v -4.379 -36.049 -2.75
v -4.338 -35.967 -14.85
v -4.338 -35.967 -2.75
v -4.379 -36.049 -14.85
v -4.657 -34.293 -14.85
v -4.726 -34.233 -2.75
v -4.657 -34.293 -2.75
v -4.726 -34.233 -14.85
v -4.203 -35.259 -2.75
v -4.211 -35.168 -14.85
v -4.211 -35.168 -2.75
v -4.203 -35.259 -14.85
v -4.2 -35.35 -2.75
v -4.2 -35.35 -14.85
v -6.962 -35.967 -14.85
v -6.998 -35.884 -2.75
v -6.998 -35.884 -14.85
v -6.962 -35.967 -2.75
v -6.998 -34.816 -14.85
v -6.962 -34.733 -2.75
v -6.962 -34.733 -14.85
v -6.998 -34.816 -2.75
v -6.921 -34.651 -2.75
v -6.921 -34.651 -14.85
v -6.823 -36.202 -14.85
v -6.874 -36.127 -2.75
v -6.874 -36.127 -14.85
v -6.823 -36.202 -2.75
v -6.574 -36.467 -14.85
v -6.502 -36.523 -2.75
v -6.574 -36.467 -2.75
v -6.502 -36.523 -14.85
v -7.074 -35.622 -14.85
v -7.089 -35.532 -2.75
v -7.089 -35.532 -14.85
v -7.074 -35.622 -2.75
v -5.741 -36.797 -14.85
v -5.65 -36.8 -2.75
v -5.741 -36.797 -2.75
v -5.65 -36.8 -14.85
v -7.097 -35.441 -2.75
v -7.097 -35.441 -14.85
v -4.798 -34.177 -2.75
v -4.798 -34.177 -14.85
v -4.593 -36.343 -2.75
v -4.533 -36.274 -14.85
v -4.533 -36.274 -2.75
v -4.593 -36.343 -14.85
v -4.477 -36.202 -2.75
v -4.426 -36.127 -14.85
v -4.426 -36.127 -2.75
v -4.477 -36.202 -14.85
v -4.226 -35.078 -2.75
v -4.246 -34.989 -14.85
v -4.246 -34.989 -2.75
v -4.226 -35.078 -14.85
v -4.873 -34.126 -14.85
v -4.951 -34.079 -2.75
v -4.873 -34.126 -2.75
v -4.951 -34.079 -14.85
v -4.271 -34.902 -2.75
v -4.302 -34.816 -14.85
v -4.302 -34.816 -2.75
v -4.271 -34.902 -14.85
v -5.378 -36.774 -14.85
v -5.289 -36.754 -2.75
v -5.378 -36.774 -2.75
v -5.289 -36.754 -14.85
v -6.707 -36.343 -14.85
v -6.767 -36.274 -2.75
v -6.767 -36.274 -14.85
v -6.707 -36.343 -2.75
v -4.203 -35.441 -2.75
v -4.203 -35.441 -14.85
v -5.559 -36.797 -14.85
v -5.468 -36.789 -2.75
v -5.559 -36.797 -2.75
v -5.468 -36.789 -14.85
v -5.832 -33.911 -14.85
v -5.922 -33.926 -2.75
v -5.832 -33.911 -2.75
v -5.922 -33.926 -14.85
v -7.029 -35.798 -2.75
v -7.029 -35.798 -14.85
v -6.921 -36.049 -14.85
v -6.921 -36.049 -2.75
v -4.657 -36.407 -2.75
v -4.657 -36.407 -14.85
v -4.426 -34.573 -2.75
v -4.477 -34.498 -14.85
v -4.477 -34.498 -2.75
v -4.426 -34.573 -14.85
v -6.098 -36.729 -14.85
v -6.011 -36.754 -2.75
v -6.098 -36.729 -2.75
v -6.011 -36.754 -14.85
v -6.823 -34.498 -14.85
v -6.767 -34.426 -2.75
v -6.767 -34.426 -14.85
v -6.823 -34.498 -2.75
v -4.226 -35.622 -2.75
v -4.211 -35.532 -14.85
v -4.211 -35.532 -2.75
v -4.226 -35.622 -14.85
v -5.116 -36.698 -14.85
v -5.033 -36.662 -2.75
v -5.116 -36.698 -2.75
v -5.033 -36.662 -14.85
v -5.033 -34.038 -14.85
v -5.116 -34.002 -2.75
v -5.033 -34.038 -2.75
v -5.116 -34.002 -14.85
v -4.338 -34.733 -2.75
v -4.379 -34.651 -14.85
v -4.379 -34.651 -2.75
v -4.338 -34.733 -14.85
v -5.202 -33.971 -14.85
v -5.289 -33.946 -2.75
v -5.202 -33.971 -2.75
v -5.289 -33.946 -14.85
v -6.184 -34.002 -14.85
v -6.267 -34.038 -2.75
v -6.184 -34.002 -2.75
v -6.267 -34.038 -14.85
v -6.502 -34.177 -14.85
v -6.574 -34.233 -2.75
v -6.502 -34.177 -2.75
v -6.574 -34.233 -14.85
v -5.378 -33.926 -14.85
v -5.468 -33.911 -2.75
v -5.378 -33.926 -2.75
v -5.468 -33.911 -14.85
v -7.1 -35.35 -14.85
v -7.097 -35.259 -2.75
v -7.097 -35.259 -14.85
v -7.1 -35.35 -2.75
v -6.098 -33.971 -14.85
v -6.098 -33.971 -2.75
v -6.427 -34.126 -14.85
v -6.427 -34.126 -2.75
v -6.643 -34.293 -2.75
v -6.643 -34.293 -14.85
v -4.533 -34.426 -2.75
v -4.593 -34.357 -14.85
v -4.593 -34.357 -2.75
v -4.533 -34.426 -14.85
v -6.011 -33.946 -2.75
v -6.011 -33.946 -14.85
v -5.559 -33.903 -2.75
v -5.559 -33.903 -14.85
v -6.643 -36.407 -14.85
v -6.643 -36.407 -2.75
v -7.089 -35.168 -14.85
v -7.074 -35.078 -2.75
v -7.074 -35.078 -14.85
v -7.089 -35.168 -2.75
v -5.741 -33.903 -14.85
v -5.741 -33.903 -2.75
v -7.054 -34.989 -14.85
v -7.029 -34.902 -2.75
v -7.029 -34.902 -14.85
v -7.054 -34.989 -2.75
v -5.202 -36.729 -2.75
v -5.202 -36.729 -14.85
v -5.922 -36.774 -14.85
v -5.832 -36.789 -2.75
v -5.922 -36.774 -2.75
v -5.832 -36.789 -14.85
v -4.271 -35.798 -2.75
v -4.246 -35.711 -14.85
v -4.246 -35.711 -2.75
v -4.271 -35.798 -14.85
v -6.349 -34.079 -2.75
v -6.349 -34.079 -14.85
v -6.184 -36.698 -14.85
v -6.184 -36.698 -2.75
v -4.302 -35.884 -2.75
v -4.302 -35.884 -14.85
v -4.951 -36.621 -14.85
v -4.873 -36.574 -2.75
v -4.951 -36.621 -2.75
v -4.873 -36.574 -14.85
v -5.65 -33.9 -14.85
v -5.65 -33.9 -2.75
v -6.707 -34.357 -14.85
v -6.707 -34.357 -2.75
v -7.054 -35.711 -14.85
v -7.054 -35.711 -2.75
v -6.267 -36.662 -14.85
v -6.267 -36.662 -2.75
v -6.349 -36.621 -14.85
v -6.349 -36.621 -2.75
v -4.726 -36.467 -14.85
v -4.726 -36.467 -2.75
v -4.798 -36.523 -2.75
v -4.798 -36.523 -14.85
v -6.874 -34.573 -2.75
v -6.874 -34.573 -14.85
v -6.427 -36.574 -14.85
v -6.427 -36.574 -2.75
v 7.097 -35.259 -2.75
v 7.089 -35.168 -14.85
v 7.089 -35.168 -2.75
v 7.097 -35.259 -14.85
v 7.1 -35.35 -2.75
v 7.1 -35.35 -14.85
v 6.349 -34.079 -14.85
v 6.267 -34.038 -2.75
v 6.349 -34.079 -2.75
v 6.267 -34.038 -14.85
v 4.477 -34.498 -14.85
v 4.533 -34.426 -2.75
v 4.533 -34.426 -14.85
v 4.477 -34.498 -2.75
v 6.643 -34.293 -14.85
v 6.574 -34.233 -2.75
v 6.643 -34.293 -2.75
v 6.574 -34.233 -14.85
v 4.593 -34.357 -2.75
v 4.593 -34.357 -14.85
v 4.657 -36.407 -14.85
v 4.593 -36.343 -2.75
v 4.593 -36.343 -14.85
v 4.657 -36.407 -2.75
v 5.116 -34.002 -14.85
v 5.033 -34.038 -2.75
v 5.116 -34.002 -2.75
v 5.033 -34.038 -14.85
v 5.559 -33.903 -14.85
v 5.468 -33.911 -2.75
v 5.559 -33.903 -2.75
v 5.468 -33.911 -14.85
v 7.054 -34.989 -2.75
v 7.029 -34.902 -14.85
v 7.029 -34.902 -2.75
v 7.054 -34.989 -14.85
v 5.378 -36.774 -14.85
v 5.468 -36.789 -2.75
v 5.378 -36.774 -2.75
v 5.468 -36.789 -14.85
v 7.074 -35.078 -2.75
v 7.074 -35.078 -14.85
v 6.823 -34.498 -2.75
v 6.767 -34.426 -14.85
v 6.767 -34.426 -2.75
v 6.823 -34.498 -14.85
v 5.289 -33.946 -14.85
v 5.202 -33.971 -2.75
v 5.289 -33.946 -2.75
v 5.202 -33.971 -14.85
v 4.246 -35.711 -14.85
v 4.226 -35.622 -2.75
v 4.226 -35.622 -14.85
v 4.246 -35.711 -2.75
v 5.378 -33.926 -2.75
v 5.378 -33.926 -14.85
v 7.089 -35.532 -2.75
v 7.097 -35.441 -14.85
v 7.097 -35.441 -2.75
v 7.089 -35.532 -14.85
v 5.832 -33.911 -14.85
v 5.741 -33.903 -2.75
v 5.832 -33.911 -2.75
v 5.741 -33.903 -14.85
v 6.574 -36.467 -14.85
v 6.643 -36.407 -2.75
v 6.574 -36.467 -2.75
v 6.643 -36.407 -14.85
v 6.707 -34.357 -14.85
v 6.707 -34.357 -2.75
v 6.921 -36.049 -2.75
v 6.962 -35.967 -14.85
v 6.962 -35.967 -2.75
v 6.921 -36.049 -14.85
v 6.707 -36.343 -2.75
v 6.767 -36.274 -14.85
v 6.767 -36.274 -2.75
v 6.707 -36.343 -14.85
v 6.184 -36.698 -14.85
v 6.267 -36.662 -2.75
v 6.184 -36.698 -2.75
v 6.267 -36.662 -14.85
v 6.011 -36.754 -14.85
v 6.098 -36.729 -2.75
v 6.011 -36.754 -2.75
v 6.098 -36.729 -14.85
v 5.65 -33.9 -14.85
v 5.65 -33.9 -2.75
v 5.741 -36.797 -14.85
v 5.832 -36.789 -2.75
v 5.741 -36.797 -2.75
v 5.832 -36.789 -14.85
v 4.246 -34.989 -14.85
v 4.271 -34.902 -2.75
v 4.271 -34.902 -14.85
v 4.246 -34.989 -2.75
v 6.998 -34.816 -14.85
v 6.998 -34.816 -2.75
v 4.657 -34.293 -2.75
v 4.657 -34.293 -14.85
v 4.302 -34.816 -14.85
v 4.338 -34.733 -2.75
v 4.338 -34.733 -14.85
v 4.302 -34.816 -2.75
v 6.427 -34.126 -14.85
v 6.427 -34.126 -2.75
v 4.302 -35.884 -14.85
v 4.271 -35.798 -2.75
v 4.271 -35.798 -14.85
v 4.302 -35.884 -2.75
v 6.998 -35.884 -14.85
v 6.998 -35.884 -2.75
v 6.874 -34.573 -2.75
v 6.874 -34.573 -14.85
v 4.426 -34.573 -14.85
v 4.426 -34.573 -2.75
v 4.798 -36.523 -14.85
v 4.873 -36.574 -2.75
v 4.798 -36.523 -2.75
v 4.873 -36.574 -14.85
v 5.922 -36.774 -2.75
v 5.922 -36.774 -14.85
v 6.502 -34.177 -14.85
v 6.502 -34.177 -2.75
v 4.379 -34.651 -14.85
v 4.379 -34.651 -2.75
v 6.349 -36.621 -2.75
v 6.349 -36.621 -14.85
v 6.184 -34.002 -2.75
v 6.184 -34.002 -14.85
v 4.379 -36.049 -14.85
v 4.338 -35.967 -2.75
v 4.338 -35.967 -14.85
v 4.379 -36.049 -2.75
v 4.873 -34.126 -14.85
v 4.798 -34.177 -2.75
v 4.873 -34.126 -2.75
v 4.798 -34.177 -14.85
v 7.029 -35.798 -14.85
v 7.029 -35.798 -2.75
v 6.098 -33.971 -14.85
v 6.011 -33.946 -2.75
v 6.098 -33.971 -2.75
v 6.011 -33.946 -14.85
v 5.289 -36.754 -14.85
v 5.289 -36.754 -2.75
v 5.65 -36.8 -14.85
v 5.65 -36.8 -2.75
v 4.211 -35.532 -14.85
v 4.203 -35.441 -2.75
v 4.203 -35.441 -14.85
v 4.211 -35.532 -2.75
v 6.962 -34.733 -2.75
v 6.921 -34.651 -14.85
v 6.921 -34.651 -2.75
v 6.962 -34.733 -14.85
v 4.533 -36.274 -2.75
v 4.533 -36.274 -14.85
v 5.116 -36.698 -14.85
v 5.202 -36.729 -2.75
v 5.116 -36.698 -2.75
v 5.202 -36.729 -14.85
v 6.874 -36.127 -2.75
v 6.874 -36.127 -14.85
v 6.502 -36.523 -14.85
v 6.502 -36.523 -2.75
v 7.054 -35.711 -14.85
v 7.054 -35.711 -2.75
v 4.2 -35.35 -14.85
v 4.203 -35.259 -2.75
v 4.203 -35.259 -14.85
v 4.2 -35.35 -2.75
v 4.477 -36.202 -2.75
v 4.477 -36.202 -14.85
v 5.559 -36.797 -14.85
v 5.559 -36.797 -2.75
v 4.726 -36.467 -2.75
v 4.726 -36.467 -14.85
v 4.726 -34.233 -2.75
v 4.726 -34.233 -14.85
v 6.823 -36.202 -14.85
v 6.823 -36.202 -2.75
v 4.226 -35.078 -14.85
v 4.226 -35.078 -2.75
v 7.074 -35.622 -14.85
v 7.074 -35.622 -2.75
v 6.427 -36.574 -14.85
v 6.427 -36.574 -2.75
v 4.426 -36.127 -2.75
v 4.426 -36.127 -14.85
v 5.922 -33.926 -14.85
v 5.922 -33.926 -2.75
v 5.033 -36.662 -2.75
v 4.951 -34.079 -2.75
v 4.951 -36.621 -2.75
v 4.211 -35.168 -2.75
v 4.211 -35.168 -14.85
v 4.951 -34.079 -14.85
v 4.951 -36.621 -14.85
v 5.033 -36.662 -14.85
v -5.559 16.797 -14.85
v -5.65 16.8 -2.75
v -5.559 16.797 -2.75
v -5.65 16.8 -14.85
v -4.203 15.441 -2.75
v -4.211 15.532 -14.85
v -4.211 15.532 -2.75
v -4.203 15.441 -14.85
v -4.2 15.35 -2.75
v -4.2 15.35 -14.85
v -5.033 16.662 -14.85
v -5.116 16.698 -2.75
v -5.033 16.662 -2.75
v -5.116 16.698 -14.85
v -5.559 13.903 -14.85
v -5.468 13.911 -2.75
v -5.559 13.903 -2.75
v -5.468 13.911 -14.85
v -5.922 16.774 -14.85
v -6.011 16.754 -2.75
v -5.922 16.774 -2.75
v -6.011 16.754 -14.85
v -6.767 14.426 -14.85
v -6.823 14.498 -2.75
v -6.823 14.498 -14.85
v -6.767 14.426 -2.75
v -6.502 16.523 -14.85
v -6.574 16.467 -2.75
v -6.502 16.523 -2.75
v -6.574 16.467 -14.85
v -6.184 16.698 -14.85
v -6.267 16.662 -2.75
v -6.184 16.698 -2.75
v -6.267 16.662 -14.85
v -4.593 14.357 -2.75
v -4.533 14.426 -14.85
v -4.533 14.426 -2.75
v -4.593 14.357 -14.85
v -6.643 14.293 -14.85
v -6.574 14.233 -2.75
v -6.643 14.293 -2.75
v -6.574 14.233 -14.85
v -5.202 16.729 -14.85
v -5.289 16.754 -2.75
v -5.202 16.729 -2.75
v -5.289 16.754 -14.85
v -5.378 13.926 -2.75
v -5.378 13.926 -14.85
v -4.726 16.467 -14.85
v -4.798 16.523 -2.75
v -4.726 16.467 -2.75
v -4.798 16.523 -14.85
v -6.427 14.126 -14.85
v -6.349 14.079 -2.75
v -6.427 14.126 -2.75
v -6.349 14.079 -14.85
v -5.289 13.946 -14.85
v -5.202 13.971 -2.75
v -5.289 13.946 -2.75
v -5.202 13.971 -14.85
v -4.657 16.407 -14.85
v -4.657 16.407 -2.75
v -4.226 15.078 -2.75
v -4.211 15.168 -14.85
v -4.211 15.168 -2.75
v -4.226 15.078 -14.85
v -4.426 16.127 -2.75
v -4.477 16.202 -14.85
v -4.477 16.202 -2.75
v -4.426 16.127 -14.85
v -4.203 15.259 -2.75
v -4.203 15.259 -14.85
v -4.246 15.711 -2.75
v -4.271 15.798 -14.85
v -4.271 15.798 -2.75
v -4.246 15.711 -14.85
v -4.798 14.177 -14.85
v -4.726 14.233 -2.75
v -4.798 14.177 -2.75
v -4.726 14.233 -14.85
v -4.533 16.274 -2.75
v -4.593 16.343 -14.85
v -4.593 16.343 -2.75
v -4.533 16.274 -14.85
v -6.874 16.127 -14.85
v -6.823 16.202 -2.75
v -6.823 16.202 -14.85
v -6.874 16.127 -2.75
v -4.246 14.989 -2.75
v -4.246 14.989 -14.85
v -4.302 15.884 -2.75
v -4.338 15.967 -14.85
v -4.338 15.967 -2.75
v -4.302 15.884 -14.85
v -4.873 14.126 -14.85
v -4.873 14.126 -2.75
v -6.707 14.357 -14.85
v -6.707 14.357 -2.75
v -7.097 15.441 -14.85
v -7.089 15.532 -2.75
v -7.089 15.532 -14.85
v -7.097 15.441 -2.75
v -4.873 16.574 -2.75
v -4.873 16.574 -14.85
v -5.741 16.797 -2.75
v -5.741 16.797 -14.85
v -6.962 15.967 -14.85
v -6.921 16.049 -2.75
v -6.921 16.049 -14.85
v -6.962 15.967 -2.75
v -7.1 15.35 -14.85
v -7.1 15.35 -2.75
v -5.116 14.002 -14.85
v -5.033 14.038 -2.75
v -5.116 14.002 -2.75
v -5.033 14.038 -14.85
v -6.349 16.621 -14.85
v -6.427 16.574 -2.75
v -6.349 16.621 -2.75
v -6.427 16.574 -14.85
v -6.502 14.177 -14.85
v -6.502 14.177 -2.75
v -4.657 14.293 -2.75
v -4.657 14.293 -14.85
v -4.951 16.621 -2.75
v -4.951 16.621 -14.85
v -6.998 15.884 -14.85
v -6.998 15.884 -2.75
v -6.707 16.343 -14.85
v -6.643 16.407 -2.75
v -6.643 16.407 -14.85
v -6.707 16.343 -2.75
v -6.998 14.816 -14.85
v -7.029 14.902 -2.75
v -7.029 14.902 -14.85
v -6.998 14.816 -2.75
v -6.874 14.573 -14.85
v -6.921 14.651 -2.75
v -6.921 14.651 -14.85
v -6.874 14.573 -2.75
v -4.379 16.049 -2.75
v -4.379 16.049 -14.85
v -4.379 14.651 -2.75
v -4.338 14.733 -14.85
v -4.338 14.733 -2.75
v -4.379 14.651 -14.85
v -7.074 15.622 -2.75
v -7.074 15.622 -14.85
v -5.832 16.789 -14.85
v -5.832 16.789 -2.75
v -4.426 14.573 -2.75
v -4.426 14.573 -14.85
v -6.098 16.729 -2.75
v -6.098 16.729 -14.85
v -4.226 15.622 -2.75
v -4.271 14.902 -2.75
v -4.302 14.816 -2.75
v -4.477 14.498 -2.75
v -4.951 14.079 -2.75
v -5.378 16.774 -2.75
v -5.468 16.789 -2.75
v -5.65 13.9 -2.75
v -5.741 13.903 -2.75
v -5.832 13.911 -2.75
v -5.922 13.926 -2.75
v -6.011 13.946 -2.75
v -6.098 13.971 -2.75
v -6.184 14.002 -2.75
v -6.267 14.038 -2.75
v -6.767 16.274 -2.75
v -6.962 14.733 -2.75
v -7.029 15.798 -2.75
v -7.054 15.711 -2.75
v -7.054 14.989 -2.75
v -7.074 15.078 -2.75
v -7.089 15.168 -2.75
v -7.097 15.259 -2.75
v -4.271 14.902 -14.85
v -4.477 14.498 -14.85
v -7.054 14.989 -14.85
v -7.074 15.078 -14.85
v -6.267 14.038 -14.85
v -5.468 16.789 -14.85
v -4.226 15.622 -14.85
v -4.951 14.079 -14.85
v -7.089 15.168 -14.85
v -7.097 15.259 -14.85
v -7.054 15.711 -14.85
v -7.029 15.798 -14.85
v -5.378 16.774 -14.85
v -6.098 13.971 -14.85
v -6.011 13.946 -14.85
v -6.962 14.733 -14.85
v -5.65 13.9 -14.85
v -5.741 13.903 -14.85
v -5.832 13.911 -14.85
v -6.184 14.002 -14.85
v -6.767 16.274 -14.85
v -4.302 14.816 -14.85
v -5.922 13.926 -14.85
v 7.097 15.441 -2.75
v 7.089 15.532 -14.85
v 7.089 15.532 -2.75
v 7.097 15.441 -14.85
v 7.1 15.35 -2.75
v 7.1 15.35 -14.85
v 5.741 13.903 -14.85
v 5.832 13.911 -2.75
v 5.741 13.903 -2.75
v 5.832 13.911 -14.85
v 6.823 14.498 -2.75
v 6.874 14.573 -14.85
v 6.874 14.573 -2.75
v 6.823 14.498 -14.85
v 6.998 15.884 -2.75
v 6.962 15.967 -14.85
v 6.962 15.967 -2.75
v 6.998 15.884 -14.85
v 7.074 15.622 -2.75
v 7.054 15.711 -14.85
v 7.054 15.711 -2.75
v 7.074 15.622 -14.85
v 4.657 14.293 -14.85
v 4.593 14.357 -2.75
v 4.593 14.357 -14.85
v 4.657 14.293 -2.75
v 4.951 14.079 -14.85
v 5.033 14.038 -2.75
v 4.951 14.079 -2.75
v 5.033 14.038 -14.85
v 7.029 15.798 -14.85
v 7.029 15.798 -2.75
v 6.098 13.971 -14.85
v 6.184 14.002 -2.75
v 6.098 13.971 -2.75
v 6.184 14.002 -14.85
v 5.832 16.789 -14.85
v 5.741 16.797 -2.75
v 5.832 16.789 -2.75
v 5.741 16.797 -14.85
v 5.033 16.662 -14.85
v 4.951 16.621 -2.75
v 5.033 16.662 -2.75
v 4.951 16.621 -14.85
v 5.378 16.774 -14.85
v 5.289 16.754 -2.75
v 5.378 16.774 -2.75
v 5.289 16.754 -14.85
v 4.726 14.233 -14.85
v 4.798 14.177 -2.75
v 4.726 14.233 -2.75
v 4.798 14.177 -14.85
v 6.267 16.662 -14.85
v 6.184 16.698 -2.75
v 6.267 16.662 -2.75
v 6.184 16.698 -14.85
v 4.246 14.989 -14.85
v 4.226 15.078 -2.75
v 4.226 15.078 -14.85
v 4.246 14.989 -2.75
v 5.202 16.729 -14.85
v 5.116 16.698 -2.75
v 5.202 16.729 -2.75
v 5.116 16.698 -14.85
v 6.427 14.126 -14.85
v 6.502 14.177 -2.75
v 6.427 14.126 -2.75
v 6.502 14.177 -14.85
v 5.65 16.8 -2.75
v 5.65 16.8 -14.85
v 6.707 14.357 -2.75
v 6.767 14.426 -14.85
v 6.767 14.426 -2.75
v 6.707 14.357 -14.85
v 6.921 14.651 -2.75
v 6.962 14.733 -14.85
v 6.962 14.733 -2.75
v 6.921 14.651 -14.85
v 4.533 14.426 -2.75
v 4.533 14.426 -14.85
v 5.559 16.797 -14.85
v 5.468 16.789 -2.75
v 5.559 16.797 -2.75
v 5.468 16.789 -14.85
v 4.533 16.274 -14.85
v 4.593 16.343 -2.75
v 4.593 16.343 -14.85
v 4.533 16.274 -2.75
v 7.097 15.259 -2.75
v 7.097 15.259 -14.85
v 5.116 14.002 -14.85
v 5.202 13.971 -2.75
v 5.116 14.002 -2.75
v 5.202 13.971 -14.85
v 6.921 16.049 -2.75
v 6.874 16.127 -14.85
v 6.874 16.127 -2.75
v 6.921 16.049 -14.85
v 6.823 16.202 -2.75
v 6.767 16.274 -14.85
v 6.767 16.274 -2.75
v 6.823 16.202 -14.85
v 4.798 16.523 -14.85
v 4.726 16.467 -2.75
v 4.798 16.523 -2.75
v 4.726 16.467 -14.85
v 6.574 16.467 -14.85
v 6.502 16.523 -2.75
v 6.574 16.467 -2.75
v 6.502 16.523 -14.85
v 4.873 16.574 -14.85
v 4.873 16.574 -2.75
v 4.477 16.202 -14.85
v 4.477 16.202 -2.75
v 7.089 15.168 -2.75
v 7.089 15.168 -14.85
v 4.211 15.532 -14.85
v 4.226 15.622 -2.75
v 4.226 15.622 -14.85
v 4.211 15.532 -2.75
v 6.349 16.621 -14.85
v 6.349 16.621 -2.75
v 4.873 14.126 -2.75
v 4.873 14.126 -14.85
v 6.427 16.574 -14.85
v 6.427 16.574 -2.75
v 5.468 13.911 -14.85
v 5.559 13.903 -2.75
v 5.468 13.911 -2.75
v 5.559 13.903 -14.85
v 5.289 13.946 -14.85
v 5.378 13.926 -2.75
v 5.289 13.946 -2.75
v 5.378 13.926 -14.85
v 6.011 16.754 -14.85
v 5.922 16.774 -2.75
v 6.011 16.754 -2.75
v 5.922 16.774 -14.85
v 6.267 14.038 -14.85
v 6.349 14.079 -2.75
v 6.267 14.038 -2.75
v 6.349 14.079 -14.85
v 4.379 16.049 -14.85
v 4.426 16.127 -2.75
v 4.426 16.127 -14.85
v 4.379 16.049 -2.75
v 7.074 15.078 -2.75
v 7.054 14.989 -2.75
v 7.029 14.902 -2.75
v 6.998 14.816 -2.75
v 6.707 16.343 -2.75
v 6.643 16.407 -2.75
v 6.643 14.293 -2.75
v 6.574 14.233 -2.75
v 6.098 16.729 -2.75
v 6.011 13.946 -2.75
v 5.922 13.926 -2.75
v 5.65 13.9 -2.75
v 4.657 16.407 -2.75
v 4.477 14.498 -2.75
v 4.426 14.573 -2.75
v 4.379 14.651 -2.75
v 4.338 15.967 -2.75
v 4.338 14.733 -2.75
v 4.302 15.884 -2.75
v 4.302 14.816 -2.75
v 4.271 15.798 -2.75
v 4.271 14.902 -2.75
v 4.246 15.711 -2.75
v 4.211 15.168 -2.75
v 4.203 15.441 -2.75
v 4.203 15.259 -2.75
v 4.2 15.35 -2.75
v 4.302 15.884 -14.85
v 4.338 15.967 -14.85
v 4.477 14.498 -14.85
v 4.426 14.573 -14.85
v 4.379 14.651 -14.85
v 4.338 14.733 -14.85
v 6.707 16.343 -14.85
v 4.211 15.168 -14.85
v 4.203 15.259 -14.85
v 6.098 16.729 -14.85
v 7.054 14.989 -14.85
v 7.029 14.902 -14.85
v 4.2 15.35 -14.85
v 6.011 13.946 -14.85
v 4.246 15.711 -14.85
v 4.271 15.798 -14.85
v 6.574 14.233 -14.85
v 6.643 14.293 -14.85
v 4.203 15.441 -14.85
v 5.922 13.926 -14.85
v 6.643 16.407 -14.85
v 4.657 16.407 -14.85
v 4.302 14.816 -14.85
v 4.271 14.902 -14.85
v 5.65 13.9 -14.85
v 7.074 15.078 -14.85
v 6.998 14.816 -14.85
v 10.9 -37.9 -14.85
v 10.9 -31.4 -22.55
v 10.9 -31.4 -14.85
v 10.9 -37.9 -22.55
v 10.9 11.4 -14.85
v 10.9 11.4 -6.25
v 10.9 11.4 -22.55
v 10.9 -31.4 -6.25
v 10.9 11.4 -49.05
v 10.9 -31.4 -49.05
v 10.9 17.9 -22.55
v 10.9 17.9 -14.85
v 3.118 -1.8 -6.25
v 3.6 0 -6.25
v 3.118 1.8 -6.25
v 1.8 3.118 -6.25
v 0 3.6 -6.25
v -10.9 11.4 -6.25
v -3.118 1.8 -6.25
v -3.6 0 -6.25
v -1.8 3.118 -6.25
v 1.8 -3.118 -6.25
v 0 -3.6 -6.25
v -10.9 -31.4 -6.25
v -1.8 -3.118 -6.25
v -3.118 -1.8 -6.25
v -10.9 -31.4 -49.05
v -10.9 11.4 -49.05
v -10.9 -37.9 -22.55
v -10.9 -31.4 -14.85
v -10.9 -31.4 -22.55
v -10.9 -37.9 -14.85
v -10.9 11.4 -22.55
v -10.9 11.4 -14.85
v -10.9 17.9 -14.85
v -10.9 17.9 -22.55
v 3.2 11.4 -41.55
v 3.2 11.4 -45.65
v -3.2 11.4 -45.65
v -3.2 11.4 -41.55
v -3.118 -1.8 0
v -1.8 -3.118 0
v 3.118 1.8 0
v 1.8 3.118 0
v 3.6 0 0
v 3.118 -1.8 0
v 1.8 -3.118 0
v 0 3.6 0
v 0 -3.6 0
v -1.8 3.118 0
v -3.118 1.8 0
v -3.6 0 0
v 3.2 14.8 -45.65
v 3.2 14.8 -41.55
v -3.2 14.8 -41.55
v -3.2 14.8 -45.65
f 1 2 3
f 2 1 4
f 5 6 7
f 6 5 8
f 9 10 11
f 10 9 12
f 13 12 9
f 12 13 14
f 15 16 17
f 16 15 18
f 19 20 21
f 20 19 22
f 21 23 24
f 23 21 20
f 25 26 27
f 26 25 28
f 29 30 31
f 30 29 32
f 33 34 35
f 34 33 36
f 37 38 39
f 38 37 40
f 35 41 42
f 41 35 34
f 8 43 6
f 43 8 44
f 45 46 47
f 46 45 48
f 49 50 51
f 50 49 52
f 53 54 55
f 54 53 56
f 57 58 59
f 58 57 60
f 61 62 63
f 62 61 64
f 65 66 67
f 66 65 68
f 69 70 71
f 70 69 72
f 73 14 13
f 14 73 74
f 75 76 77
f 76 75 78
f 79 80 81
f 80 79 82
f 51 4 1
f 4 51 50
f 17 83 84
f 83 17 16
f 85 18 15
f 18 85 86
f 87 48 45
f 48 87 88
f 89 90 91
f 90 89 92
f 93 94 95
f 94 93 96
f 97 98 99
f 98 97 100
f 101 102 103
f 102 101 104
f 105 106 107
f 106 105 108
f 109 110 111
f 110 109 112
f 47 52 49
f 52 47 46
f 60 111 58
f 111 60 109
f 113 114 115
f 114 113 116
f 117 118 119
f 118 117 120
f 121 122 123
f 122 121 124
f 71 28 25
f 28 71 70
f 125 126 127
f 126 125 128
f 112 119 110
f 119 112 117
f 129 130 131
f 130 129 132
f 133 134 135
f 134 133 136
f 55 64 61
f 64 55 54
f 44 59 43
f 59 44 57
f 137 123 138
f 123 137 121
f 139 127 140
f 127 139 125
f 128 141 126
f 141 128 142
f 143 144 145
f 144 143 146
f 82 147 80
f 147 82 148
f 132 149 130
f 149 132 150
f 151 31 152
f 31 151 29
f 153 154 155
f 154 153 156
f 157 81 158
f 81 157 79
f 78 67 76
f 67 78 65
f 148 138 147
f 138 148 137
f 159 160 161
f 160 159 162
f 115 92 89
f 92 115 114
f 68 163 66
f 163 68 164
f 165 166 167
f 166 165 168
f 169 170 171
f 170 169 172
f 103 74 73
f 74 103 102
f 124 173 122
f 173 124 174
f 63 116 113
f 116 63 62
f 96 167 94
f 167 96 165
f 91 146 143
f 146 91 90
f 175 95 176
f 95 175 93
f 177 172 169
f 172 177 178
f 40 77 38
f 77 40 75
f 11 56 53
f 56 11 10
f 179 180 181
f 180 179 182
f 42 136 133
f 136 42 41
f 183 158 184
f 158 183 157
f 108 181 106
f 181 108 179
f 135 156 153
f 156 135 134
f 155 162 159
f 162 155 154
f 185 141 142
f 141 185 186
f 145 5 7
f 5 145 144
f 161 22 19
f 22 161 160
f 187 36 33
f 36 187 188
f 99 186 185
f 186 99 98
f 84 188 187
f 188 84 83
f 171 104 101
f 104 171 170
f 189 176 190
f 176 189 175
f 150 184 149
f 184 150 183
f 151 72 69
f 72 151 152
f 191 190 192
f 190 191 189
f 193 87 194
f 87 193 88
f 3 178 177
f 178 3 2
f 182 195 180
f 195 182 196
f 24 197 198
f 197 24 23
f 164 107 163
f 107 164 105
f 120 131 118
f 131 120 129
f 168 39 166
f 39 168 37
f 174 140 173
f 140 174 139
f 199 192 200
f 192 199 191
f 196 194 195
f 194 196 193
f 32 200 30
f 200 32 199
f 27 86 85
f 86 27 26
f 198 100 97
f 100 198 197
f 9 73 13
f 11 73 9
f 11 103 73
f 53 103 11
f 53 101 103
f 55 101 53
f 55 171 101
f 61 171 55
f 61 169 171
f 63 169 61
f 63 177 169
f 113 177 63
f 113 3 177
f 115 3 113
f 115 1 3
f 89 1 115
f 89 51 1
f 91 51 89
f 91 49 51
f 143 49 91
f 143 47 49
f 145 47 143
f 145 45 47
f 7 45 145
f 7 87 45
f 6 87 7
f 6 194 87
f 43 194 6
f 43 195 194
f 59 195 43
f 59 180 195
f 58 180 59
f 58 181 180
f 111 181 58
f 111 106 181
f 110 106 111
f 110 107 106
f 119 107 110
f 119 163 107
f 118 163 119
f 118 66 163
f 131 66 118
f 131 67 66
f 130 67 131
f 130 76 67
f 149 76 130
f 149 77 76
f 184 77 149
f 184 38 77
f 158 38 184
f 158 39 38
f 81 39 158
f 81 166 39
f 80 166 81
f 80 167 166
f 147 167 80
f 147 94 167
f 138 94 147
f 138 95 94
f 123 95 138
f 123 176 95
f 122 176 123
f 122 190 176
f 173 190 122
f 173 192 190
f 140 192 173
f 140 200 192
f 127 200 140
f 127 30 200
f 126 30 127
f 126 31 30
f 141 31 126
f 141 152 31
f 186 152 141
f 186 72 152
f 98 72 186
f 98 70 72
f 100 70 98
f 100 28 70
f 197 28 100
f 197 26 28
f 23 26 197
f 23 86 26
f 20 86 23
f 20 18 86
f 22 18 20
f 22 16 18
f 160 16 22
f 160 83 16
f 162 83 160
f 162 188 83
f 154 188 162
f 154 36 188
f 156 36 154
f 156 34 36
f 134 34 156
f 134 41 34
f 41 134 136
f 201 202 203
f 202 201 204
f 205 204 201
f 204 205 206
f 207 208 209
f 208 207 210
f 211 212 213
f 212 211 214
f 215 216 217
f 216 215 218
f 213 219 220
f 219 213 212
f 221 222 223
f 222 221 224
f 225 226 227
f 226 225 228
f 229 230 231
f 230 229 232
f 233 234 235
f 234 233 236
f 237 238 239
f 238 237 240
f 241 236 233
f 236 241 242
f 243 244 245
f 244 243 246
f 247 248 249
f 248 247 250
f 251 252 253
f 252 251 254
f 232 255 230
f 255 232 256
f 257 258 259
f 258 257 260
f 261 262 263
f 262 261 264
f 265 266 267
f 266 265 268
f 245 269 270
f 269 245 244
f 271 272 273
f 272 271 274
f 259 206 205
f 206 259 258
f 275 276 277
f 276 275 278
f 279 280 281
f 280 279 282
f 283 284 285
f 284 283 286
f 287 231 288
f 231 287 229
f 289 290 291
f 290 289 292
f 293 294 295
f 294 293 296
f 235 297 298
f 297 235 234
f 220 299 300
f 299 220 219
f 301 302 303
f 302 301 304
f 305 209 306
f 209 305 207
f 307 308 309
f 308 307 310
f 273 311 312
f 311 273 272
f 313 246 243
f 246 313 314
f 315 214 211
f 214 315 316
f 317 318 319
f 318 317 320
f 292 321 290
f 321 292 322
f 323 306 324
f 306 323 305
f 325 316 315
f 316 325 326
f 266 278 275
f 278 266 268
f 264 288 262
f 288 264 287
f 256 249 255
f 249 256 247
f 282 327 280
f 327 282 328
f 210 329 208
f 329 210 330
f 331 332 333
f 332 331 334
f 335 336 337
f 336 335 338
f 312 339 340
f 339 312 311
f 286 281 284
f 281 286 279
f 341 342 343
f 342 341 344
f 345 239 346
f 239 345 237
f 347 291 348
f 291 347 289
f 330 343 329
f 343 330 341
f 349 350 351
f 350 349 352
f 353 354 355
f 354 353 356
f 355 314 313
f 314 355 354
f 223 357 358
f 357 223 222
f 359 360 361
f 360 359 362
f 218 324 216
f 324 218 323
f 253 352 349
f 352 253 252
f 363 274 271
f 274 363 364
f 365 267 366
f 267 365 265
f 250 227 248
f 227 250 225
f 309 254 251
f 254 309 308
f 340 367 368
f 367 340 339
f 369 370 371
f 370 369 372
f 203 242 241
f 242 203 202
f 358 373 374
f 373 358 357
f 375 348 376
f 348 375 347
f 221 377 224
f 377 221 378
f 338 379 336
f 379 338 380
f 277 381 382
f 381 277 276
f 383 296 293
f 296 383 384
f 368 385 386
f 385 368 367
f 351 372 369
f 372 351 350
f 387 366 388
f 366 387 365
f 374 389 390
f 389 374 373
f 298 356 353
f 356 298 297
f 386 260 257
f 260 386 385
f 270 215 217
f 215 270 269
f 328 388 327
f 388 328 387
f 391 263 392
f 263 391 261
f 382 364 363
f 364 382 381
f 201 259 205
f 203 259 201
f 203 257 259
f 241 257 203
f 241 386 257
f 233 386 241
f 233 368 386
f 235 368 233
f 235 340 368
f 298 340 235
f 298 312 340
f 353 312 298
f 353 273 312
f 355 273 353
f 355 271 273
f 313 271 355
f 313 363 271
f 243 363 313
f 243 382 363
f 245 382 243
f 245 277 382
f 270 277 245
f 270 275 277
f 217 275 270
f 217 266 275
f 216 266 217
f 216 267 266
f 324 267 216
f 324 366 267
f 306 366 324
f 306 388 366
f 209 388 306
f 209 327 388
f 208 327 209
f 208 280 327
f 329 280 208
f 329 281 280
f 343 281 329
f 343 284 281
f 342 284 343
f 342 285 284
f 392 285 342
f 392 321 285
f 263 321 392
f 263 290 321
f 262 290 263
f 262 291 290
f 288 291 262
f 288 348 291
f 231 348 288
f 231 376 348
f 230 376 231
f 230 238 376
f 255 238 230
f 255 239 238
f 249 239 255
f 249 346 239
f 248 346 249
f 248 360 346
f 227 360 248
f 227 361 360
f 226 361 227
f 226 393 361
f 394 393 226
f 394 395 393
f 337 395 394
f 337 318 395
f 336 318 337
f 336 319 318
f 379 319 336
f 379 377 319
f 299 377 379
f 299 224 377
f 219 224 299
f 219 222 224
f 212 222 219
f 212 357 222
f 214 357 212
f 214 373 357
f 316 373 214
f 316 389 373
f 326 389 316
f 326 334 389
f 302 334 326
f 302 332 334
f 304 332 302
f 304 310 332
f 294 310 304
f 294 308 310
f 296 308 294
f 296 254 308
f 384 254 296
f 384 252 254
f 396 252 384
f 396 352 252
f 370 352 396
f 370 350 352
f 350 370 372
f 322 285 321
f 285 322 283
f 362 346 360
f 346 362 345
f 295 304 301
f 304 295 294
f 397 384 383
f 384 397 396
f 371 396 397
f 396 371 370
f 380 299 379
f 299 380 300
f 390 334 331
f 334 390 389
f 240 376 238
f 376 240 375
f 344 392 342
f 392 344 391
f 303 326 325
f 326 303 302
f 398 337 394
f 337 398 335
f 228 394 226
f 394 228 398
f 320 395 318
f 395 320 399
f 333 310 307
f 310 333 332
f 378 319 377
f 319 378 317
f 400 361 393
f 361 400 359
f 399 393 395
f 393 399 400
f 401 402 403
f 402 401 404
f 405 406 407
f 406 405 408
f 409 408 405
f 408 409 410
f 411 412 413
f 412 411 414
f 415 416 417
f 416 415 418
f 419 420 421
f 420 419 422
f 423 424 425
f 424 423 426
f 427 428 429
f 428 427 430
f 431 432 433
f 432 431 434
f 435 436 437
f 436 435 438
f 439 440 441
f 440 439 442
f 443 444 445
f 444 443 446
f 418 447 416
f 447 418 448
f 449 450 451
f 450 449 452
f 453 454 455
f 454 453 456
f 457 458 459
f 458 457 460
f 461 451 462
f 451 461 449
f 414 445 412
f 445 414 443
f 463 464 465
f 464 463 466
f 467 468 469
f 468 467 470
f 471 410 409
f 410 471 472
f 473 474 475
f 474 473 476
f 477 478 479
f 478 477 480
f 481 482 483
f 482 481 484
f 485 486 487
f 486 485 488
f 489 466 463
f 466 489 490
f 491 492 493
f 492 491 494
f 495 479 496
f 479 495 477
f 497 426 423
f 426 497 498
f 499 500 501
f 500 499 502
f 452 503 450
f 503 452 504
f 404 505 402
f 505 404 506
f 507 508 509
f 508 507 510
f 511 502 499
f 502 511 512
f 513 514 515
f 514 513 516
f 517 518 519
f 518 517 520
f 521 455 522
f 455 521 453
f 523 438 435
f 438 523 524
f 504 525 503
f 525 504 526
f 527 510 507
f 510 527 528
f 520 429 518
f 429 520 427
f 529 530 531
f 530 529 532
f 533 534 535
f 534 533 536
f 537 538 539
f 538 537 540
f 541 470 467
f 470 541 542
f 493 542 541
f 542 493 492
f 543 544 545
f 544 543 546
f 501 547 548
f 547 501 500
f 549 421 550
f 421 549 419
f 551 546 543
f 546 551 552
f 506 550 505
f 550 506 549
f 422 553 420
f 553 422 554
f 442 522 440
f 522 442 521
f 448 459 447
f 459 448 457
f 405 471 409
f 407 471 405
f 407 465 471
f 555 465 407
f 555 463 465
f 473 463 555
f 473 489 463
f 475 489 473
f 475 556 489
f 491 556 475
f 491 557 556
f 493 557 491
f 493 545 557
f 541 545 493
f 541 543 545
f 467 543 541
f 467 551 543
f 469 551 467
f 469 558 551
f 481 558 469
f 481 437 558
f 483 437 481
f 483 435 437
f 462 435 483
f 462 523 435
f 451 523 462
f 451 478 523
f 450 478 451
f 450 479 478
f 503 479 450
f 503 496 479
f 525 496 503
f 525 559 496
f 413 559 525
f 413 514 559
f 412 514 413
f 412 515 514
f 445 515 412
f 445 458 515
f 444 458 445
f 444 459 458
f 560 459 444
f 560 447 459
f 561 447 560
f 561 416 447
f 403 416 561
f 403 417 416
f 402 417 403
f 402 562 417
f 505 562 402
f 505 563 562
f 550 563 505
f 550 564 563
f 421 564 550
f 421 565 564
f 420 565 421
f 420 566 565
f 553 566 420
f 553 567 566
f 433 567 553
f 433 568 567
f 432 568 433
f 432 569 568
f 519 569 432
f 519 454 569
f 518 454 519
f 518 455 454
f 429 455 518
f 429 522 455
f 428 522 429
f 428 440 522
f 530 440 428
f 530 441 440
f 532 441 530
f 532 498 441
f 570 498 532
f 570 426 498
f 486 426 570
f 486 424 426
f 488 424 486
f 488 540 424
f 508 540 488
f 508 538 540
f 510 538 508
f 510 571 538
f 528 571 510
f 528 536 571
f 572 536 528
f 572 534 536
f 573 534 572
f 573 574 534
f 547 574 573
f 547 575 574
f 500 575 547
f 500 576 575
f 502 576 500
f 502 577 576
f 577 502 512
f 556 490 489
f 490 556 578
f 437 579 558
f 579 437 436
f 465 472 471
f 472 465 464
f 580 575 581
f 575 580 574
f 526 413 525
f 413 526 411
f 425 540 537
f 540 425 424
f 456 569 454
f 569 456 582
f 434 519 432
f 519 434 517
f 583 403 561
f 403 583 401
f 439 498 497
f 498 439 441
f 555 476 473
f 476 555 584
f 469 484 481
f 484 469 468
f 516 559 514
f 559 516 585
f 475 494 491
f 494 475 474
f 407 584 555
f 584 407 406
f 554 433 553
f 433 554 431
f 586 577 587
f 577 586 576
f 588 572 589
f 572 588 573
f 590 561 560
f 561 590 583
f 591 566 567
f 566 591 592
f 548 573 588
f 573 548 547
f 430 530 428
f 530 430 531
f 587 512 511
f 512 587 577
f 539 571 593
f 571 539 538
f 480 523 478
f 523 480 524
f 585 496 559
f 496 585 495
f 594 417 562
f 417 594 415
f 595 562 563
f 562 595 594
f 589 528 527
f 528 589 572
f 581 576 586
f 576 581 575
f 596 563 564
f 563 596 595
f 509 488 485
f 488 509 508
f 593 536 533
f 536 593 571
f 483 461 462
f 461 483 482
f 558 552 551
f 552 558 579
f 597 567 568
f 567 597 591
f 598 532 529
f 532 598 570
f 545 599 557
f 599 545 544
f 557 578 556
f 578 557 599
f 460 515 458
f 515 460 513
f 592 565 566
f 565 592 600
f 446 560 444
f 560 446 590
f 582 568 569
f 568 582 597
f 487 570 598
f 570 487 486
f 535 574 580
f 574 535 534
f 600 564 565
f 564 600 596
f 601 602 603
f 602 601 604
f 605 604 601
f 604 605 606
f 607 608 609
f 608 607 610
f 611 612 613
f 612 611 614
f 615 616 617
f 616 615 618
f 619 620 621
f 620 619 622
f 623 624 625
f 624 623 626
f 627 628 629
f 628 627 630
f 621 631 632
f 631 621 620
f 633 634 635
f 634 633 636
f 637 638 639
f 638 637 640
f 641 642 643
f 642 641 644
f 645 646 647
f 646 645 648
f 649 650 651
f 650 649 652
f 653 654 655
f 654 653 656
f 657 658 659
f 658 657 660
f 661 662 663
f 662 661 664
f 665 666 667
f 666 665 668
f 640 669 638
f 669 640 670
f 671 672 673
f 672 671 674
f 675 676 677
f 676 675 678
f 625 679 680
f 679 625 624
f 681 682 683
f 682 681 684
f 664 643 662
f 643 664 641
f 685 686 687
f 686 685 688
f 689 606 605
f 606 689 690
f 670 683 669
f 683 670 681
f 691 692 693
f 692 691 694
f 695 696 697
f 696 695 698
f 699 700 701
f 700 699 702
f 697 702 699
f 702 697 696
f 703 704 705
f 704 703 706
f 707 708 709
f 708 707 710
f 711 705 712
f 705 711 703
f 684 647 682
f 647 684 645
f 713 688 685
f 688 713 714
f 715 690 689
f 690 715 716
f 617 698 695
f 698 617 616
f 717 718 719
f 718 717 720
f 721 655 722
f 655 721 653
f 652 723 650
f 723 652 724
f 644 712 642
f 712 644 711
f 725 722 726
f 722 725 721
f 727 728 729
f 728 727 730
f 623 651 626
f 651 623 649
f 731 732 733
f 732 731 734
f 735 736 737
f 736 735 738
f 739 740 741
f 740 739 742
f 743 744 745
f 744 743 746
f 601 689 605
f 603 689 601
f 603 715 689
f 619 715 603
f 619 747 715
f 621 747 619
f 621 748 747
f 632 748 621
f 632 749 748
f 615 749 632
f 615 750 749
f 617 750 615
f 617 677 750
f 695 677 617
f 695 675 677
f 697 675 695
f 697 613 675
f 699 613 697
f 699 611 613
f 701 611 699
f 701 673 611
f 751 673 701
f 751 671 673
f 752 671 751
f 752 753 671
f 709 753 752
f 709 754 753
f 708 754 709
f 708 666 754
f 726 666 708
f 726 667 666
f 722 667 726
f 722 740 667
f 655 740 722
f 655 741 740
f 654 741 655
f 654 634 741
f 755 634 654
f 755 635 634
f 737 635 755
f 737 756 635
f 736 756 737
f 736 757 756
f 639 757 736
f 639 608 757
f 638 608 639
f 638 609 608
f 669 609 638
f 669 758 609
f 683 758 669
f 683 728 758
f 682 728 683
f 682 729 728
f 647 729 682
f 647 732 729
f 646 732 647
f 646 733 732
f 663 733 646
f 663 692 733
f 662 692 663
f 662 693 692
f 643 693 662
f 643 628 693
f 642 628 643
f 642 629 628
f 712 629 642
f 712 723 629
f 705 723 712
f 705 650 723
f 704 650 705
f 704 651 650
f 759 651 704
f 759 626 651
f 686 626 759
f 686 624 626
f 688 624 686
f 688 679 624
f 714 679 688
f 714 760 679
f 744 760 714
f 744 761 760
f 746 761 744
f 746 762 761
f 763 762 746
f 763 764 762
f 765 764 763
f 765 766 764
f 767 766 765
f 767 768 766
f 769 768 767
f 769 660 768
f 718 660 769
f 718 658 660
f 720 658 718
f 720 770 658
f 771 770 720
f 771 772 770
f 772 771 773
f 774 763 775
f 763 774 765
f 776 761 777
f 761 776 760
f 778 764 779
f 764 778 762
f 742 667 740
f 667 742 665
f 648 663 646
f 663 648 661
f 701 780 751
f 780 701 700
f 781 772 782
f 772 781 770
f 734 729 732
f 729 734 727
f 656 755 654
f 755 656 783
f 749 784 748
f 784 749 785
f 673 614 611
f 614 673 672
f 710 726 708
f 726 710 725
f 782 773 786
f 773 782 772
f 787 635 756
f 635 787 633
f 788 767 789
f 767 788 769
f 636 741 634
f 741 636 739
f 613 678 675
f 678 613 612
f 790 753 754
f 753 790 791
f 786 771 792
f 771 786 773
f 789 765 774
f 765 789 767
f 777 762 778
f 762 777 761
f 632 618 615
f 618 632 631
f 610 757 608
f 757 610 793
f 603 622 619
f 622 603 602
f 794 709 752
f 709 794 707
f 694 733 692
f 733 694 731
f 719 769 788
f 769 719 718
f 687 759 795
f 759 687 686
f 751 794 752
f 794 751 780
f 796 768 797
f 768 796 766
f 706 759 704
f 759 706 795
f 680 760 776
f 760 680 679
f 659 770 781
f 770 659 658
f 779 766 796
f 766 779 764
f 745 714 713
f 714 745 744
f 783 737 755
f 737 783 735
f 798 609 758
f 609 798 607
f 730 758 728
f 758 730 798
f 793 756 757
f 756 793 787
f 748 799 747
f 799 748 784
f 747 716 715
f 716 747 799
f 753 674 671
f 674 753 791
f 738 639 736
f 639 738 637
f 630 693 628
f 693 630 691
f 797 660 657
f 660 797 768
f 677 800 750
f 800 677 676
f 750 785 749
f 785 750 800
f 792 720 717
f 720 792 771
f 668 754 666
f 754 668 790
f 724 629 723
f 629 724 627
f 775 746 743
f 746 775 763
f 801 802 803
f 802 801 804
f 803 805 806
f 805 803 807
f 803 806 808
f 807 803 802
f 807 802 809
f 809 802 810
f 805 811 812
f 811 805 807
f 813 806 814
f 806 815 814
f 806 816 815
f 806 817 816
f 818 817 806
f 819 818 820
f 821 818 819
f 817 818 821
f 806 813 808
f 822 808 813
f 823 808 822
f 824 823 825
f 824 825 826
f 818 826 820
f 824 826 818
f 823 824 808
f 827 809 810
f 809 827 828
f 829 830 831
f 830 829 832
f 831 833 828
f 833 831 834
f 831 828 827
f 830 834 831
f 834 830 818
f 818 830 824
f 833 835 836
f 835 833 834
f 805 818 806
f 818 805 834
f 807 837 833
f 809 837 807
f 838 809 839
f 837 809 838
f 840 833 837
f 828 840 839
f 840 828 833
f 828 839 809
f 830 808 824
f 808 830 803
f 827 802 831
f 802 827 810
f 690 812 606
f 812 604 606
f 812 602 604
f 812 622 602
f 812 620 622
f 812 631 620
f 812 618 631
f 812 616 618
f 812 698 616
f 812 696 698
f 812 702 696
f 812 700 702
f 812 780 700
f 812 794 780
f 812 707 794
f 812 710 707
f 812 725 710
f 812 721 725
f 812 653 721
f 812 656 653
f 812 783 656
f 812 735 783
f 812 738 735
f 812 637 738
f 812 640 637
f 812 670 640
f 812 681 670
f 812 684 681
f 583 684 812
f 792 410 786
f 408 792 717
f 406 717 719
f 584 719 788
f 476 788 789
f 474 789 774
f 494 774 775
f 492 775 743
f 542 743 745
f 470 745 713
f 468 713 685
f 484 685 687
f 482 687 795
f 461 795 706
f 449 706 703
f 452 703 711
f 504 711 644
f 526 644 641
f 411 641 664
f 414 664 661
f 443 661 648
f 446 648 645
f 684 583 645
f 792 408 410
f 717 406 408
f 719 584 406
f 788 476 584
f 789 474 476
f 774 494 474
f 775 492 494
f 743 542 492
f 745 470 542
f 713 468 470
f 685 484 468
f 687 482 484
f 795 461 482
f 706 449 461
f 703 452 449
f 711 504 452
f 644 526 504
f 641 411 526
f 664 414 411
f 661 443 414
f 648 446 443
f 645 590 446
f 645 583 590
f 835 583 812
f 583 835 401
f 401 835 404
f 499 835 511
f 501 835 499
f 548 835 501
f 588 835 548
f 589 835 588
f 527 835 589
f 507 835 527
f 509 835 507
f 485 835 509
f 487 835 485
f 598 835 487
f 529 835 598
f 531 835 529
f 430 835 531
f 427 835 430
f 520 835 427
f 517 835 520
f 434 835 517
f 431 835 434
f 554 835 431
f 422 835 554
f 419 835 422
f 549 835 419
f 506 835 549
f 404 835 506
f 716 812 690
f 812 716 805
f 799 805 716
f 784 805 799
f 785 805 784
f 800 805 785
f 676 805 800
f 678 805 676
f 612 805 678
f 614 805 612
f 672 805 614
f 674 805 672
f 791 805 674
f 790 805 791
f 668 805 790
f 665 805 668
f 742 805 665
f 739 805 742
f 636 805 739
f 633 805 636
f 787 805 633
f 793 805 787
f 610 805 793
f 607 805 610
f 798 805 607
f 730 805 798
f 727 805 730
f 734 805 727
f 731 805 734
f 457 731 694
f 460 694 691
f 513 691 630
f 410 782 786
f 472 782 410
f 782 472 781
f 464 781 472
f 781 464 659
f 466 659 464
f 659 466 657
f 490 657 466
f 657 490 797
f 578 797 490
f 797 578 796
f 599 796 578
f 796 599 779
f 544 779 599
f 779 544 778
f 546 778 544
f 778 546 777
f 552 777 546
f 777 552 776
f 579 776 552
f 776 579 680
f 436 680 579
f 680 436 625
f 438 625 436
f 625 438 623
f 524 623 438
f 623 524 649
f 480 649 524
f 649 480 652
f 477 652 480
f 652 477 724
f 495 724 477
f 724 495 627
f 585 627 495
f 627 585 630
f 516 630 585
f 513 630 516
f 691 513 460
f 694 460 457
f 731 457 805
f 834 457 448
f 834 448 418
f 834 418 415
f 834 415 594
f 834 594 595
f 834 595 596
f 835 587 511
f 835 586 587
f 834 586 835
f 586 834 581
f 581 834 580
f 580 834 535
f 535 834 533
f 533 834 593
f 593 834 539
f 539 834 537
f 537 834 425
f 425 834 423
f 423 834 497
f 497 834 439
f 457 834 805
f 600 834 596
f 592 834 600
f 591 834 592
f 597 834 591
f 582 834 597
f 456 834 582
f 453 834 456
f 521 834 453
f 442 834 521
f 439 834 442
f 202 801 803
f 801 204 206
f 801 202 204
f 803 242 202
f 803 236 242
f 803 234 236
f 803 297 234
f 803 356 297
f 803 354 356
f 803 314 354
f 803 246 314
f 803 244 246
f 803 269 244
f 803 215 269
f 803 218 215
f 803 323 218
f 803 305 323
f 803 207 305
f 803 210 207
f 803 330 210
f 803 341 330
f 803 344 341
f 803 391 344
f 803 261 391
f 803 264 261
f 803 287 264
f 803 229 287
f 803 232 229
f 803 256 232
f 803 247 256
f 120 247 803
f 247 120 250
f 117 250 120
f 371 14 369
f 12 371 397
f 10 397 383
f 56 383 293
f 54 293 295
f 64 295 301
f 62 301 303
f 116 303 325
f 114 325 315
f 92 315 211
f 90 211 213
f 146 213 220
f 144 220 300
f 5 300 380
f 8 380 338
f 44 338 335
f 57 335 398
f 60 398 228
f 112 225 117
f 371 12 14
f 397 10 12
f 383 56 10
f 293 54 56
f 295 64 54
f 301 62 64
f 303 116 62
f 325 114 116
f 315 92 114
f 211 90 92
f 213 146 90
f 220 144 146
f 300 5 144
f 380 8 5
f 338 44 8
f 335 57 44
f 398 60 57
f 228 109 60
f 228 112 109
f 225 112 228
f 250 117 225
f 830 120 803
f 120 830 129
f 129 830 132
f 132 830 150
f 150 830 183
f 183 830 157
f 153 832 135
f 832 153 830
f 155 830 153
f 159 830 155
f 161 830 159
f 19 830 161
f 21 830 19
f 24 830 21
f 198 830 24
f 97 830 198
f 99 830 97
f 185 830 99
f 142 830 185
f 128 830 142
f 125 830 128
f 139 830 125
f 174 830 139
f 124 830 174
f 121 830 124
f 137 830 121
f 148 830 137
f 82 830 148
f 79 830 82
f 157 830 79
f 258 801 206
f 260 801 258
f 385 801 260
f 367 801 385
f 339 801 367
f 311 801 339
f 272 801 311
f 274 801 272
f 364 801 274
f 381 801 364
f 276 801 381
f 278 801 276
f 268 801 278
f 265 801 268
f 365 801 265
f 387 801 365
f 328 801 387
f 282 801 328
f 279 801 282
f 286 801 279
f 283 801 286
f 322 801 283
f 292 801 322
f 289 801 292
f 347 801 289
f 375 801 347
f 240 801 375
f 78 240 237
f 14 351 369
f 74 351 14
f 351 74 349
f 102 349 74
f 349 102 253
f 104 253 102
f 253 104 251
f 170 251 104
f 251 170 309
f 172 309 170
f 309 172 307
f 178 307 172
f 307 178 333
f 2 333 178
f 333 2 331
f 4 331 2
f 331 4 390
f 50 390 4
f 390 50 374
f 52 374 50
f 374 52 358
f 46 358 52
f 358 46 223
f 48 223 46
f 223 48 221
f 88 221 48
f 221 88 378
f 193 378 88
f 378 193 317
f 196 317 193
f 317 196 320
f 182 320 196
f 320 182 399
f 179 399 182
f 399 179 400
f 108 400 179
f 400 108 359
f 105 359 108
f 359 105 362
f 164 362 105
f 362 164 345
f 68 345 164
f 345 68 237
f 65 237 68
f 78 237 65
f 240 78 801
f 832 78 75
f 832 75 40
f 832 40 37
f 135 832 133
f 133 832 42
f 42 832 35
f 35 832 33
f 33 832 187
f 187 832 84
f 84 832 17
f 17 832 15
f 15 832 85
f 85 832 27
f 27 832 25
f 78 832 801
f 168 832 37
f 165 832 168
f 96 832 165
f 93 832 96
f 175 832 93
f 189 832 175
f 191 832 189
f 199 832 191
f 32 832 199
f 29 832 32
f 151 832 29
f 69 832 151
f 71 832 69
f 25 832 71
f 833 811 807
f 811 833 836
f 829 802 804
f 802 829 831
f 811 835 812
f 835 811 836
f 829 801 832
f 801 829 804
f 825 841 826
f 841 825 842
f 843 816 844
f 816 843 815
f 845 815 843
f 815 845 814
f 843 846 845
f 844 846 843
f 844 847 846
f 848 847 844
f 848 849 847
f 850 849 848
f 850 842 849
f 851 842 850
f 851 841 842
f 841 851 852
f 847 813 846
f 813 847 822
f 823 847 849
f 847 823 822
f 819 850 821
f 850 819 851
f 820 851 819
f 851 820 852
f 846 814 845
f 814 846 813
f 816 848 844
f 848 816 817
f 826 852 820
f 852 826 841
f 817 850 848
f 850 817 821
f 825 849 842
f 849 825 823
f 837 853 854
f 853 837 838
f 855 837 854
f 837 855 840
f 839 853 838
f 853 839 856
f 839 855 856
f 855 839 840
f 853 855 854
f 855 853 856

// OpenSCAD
// When calling this module, use toleranceMotor(boolean,boolean,boolean, number); 
// The first boolean determines the bolt direction(true is up, false is down) and 
// the second determines where the module is centered (true centers at the hub, 
// false centers at the motor mount).
// the third boolean determines whether to use the large cylindrical hub or the 
// small metal nub. 
// The Fourth number indicated the tolerance of the motor (default is .4 mm)

//THIS IS FOR IF YOU USE OTHER KINDS OF MOTORS, MOTOROUTCROP IS THE DISTANCE FROM THE MOUNTING PLATE TO THE BUISNESS END OF YOUR MOTOR, IF YOU EVER NEED TO SWITCH TO ANOTHER JUST CHANGE THIS VALUE TO THE ACTUAL VALUE

function StandardServoHeightAbvWings(tolerance=.6)=(StandardServoHeight()-(StandardServoWingsHeight()+StandardServoWingsDist()+tolerance*2));


function StandardServoOutcrop()= StandardServoCylinderHeight()+StandardServoHeightAbvWings();

function StandardServoWingLength()= (StandardServoLength()-StandardServoBaseLength())/2;


//for use when the motor is incorporated into parts
	//this is distance, the short way, from the edge of the motor to the center of the hub
function StandardServoCenterDist()=(StandardServoCylinderDiam()/2) + ((StandardServoLength()-StandardServoBaseLength())/2-StandardServoTolerance()*2); 

//basic motor shape
function StandardServoHeight()=42;
function StandardServoBaseLength()=42;
function StandardServoThickness()=21;

//wings for mounting
function StandardServoWingsHeight()=5.5;
function StandardServoLength()=55;
function StandardServoWingsDist()=26.5;
function StandardServoBoltHeadHeight()=1.4;

//cylinder on top of motor
function StandardServoCylinderHeight()=(46-38);
function StandardServoCylinderDiam()=21;
function StandardServoCylinderDist()=31;

//nub on top of motor
function StandardServoNubHeight()=5.85;
function StandardServoNubDiam(3dPrinterTolerance=.4)=6+3dPrinterTolerance;

//all bolts
function StandardServoBoltHeight()=13.5;
function StandardServoBoltDiam()=2.5;

//body bolts
function StandardServoBoltSideDist()=4.35;
function StandardServoBoltEdgeDist()=4.85;

//cylinder bolts
function StandardServoCylBoltDist()=7.62;

//hub for wires
function StandardServoHubHeight()=3.7;
function StandardServoHubWidth()=6;
function StandardServoHubLength()=3;
function StandardServoHubDist()=3;

//tolerance for servo
function StandardServoTolerance()=.6;

//When calling this module, use StandardServoMotor(boolean,boolean); The first boolean determines the bolt direction(true is up, false is down) and the second determines where the module is centered (true centers at the hub, false centers at the motor mount)

//defining a bolt
module StandardServoBolt(ServoTolerance=StandardServoTolerance())
{
	cylinder(h=StandardServoBoltHeight()+ServoTolerance, r=(StandardServoBoltDiam()+ServoTolerance)/2, $fn=100);
}

module bodyBolts(boltPlacementZ,ServoTolerance=StandardServoTolerance())
{
		translate([StandardServoBoltEdgeDist(),-StandardServoBoltSideDist(),boltPlacementZ])
		{
			StandardServoBolt(ServoTolerance);
		}
		
		translate([(StandardServoThickness()-StandardServoBoltEdgeDist()),-StandardServoBoltSideDist(),boltPlacementZ])
		{
			StandardServoBolt(ServoTolerance);
		}

		translate([StandardServoBoltEdgeDist(),(StandardServoBaseLength()+StandardServoBoltSideDist()),boltPlacementZ])
		{
			StandardServoBolt(ServoTolerance);
		}
		
		translate([(StandardServoThickness()-StandardServoBoltEdgeDist()),(StandardServoBaseLength()+StandardServoBoltSideDist()),boltPlacementZ])
		{
			StandardServoBolt(ServoTolerance);
		}
}

module StandardServoBlock(boltsUp=true, Cylinder=1, ServoTolerance=StandardServoTolerance()){
	union()
	{
//basic motor shape
		translate([-ServoTolerance, -ServoTolerance, -ServoTolerance])
		{
			cube([StandardServoThickness()+ServoTolerance*2, StandardServoBaseLength()+ServoTolerance*2, StandardServoHeight()+ServoTolerance*2]);
		}

//wings for mounting
		translate([-ServoTolerance, (-ServoTolerance+((StandardServoBaseLength()-StandardServoLength())/2)), StandardServoWingsDist()-ServoTolerance])
		{
			cube([StandardServoThickness()+ServoTolerance*2, StandardServoLength()+ServoTolerance*2, StandardServoWingsHeight()+ServoTolerance*2+StandardServoBoltHeadHeight()]);
		}

//determines if you should make the cylinder or a nub
if(Cylinder==1){
//cylinder on top of motor
		translate([StandardServoCylinderDiam()/2,StandardServoCylinderDist(),StandardServoHeight()])
		{
			cylinder(StandardServoCylinderHeight()+ServoTolerance*2, StandardServoCylinderDiam()/2+ServoTolerance, StandardServoCylinderDiam()/2+ServoTolerance, 0);

		}

//cylinder bolts
		translate([StandardServoThickness()/2,StandardServoCylinderDist()-StandardServoCylBoltDist(),(StandardServoHeight()+StandardServoCylinderHeight())])
		{
			StandardServoBolt(ServoTolerance);
		}

		translate([StandardServoThickness()/2,StandardServoCylinderDist()+StandardServoCylBoltDist(),(StandardServoHeight()+StandardServoCylinderHeight())])
		{
			StandardServoBolt(ServoTolerance);
		}

		translate([StandardServoThickness()/2+StandardServoCylBoltDist(),StandardServoCylinderDist(),(StandardServoHeight()+StandardServoCylinderHeight())])
		{
			StandardServoBolt(ServoTolerance);
		}

		translate([StandardServoThickness()/2-StandardServoCylBoltDist(),StandardServoCylinderDist(),(StandardServoHeight()+StandardServoCylinderHeight())])
		{
			StandardServoBolt(ServoTolerance);
		}
}else{
	if(Cylinder==2){
//nub on top of motor
		translate([StandardServoCylinderDiam()/2,StandardServoCylinderDist(),StandardServoHeight()])
		{
			cylinder(StandardServoNubHeight()+ServoTolerance*2, StandardServoNubDiam()/2+ServoTolerance, StandardServoNubDiam()/2+ServoTolerance, 0);

		}
}else{
	if(Cylinder==3){
	union()
	{
		translate([StandardServoCylinderDiam()/2,StandardServoCylinderDist(),StandardServoHeight()])
		{
			cylinder(StandardServoNubHeight()+ServoTolerance*2, StandardServoNubDiam()/2+ServoTolerance, StandardServoNubDiam()/2+ServoTolerance, 0);

		}

		translate([StandardServoThickness()/2+StandardServoTolerance(),StandardServoCylinderDist(),StandardServoHeight()+StandardServoNubHeight()+ServoTolerance*6])
		{
			Servo_wheel_4_arm_horn();
		}
	}
}
}	
}

		if(boltsUp==true){
			bodyBolts(StandardServoWingsDist()+StandardServoWingsHeight(),ServoTolerance);
		}else{
			bodyBolts(StandardServoWingsDist()-StandardServoBoltHeight(),ServoTolerance);
		}
		
//hub for wires
		translate([(StandardServoThickness()-(StandardServoHubWidth()+ServoTolerance))/2,(StandardServoBaseLength()+ServoTolerance),StandardServoHubDist()])
		{
			cube([StandardServoHubWidth()+ServoTolerance,StandardServoHubLength()+ServoTolerance,StandardServoHubHeight()+ServoTolerance]);
		}
	}
}



//making the motor
module StandardServoMotor(boltsUp=true, Cylinder=1, hornCentered=false, ServoTolerance=StandardServoTolerance())
{
	if(hornCentered==true){
		if(Cylinder==1){
			translate([-StandardServoThickness()/2,-StandardServoCylinderDist(),-(StandardServoHeight()+StandardServoCylinderHeight())-ServoTolerance*2])
			{
				StandardServoBlock(boltsUp,Cylinder,ServoTolerance);
			}
		}else{
			if(Cylinder==2){
			translate([-StandardServoThickness()/2,-StandardServoCylinderDist(),-(StandardServoHeight()+StandardServoNubHeight())-ServoTolerance*2])
			{
				StandardServoBlock(boltsUp,Cylinder,ServoTolerance);
			}
			}else{
				translate([-StandardServoThickness()/2,-StandardServoCylinderDist(),-(StandardServoHeight()+StandardServoNubHeight())-ServoTolerance*2-horn_height+.5])
				{
					StandardServoBlock(boltsUp,Cylinder,ServoTolerance);
				}
			}
			}
	}else{
		if(boltsUp == true){
			translate([ServoTolerance,(StandardServoLength()-StandardServoBaseLength())/2+ServoTolerance,(-StandardServoHeight()+(StandardServoHeight()-StandardServoWingsDist())-StandardServoWingsHeight()-ServoTolerance*4)])
			{	
				StandardServoBlock(boltsUp,Cylinder,ServoTolerance);
			}
		}else{
			translate([ServoTolerance,(StandardServoLength()-StandardServoBaseLength())/2+ServoTolerance,(-StandardServoHeight()+(StandardServoHeight()-StandardServoWingsDist())-StandardServoWingsHeight()-ServoTolerance*4)])
			{	
				StandardServoBlock(boltsUp,Cylinder,ServoTolerance);
			}
		}
	}

}


///YOU MIGHT WANT TO CLEAN UP THE PRONGEY GUY

//-------------------------------------------
//-- Futaba 3003 4-arm horn
//-------------------------------------------

//-- Futaba 3003 4-arm horn parameters
a4h_end_diam = 5;
a4h_center_diam = 10;
a4h_arm_length = 15;
a4h_drill_distance = 13.3;

horn_drill_diam = 2;
horn_drill_distance = 8;
horn_height = 4;



function horn_height()=4;

module horn4(h=5)
{
  union() {
    //-- Center part (is a square)
    cube([a4h_center_diam+0.2,a4h_center_diam+0.2,h],center=true);

    //-- Place the 4 arms in every side of the cube
    for ( i = [0 : 3] ) {
      rotate( [0,0,i*90])
      translate([0, a4h_center_diam/2, 0])
      horn4_arm(h);
    }
  }
}
module horn4_arm(h=5)
{
  translate([0,a4h_arm_length-a4h_end_diam/2,0])
  //-- The arm consist of the perimeter of a cylinder and a cube
  hull() {
    cylinder(r=a4h_end_diam/2, h=h, center=true, $fn=20);
    translate([0,1-a4h_arm_length+a4h_end_diam/2,0])
      cube([a4h_center_diam,2,h],center=true);
  }
}
module Servo_wheel_4_arm_horn()
{    
      horn4(h= horn_height);
}
//--------------------------------------------------------------
//-- Generic module for the horn's drills
//-- Parameters:
//--  d = drill's radial distance (from the horn's center)
//--  n = number of drills
//--  h = wheel height
//--------------------------------------------------------------
module horn_drills(d,n,h)
{
  union() {
    for ( i = [0 : n-1] ) {
        rotate([0,0,i*360/n])
        translate([0,horn_drill_distance,0])
        cylinder(r=horn_drill_diam/2, h=h+10,center=true, $fn=60);  
      }
  }
}




// StandardServoMotor (boolean,number,boolean, number); 
//The first boolean determines the bolt direction(true is up, false is down, default=true), 
//the first number determines whether to use the large cylindrical hub (1), the small metal nub (2), or the 4-arm horn (3)(default=1). The second boolean determines where the module is centered (true centers at the hub, false centers at the motor mount, default=false). The number indicated the tolerance of the motor (default is .4 mm)

StandardServoMotor(true,2,true,.4);
